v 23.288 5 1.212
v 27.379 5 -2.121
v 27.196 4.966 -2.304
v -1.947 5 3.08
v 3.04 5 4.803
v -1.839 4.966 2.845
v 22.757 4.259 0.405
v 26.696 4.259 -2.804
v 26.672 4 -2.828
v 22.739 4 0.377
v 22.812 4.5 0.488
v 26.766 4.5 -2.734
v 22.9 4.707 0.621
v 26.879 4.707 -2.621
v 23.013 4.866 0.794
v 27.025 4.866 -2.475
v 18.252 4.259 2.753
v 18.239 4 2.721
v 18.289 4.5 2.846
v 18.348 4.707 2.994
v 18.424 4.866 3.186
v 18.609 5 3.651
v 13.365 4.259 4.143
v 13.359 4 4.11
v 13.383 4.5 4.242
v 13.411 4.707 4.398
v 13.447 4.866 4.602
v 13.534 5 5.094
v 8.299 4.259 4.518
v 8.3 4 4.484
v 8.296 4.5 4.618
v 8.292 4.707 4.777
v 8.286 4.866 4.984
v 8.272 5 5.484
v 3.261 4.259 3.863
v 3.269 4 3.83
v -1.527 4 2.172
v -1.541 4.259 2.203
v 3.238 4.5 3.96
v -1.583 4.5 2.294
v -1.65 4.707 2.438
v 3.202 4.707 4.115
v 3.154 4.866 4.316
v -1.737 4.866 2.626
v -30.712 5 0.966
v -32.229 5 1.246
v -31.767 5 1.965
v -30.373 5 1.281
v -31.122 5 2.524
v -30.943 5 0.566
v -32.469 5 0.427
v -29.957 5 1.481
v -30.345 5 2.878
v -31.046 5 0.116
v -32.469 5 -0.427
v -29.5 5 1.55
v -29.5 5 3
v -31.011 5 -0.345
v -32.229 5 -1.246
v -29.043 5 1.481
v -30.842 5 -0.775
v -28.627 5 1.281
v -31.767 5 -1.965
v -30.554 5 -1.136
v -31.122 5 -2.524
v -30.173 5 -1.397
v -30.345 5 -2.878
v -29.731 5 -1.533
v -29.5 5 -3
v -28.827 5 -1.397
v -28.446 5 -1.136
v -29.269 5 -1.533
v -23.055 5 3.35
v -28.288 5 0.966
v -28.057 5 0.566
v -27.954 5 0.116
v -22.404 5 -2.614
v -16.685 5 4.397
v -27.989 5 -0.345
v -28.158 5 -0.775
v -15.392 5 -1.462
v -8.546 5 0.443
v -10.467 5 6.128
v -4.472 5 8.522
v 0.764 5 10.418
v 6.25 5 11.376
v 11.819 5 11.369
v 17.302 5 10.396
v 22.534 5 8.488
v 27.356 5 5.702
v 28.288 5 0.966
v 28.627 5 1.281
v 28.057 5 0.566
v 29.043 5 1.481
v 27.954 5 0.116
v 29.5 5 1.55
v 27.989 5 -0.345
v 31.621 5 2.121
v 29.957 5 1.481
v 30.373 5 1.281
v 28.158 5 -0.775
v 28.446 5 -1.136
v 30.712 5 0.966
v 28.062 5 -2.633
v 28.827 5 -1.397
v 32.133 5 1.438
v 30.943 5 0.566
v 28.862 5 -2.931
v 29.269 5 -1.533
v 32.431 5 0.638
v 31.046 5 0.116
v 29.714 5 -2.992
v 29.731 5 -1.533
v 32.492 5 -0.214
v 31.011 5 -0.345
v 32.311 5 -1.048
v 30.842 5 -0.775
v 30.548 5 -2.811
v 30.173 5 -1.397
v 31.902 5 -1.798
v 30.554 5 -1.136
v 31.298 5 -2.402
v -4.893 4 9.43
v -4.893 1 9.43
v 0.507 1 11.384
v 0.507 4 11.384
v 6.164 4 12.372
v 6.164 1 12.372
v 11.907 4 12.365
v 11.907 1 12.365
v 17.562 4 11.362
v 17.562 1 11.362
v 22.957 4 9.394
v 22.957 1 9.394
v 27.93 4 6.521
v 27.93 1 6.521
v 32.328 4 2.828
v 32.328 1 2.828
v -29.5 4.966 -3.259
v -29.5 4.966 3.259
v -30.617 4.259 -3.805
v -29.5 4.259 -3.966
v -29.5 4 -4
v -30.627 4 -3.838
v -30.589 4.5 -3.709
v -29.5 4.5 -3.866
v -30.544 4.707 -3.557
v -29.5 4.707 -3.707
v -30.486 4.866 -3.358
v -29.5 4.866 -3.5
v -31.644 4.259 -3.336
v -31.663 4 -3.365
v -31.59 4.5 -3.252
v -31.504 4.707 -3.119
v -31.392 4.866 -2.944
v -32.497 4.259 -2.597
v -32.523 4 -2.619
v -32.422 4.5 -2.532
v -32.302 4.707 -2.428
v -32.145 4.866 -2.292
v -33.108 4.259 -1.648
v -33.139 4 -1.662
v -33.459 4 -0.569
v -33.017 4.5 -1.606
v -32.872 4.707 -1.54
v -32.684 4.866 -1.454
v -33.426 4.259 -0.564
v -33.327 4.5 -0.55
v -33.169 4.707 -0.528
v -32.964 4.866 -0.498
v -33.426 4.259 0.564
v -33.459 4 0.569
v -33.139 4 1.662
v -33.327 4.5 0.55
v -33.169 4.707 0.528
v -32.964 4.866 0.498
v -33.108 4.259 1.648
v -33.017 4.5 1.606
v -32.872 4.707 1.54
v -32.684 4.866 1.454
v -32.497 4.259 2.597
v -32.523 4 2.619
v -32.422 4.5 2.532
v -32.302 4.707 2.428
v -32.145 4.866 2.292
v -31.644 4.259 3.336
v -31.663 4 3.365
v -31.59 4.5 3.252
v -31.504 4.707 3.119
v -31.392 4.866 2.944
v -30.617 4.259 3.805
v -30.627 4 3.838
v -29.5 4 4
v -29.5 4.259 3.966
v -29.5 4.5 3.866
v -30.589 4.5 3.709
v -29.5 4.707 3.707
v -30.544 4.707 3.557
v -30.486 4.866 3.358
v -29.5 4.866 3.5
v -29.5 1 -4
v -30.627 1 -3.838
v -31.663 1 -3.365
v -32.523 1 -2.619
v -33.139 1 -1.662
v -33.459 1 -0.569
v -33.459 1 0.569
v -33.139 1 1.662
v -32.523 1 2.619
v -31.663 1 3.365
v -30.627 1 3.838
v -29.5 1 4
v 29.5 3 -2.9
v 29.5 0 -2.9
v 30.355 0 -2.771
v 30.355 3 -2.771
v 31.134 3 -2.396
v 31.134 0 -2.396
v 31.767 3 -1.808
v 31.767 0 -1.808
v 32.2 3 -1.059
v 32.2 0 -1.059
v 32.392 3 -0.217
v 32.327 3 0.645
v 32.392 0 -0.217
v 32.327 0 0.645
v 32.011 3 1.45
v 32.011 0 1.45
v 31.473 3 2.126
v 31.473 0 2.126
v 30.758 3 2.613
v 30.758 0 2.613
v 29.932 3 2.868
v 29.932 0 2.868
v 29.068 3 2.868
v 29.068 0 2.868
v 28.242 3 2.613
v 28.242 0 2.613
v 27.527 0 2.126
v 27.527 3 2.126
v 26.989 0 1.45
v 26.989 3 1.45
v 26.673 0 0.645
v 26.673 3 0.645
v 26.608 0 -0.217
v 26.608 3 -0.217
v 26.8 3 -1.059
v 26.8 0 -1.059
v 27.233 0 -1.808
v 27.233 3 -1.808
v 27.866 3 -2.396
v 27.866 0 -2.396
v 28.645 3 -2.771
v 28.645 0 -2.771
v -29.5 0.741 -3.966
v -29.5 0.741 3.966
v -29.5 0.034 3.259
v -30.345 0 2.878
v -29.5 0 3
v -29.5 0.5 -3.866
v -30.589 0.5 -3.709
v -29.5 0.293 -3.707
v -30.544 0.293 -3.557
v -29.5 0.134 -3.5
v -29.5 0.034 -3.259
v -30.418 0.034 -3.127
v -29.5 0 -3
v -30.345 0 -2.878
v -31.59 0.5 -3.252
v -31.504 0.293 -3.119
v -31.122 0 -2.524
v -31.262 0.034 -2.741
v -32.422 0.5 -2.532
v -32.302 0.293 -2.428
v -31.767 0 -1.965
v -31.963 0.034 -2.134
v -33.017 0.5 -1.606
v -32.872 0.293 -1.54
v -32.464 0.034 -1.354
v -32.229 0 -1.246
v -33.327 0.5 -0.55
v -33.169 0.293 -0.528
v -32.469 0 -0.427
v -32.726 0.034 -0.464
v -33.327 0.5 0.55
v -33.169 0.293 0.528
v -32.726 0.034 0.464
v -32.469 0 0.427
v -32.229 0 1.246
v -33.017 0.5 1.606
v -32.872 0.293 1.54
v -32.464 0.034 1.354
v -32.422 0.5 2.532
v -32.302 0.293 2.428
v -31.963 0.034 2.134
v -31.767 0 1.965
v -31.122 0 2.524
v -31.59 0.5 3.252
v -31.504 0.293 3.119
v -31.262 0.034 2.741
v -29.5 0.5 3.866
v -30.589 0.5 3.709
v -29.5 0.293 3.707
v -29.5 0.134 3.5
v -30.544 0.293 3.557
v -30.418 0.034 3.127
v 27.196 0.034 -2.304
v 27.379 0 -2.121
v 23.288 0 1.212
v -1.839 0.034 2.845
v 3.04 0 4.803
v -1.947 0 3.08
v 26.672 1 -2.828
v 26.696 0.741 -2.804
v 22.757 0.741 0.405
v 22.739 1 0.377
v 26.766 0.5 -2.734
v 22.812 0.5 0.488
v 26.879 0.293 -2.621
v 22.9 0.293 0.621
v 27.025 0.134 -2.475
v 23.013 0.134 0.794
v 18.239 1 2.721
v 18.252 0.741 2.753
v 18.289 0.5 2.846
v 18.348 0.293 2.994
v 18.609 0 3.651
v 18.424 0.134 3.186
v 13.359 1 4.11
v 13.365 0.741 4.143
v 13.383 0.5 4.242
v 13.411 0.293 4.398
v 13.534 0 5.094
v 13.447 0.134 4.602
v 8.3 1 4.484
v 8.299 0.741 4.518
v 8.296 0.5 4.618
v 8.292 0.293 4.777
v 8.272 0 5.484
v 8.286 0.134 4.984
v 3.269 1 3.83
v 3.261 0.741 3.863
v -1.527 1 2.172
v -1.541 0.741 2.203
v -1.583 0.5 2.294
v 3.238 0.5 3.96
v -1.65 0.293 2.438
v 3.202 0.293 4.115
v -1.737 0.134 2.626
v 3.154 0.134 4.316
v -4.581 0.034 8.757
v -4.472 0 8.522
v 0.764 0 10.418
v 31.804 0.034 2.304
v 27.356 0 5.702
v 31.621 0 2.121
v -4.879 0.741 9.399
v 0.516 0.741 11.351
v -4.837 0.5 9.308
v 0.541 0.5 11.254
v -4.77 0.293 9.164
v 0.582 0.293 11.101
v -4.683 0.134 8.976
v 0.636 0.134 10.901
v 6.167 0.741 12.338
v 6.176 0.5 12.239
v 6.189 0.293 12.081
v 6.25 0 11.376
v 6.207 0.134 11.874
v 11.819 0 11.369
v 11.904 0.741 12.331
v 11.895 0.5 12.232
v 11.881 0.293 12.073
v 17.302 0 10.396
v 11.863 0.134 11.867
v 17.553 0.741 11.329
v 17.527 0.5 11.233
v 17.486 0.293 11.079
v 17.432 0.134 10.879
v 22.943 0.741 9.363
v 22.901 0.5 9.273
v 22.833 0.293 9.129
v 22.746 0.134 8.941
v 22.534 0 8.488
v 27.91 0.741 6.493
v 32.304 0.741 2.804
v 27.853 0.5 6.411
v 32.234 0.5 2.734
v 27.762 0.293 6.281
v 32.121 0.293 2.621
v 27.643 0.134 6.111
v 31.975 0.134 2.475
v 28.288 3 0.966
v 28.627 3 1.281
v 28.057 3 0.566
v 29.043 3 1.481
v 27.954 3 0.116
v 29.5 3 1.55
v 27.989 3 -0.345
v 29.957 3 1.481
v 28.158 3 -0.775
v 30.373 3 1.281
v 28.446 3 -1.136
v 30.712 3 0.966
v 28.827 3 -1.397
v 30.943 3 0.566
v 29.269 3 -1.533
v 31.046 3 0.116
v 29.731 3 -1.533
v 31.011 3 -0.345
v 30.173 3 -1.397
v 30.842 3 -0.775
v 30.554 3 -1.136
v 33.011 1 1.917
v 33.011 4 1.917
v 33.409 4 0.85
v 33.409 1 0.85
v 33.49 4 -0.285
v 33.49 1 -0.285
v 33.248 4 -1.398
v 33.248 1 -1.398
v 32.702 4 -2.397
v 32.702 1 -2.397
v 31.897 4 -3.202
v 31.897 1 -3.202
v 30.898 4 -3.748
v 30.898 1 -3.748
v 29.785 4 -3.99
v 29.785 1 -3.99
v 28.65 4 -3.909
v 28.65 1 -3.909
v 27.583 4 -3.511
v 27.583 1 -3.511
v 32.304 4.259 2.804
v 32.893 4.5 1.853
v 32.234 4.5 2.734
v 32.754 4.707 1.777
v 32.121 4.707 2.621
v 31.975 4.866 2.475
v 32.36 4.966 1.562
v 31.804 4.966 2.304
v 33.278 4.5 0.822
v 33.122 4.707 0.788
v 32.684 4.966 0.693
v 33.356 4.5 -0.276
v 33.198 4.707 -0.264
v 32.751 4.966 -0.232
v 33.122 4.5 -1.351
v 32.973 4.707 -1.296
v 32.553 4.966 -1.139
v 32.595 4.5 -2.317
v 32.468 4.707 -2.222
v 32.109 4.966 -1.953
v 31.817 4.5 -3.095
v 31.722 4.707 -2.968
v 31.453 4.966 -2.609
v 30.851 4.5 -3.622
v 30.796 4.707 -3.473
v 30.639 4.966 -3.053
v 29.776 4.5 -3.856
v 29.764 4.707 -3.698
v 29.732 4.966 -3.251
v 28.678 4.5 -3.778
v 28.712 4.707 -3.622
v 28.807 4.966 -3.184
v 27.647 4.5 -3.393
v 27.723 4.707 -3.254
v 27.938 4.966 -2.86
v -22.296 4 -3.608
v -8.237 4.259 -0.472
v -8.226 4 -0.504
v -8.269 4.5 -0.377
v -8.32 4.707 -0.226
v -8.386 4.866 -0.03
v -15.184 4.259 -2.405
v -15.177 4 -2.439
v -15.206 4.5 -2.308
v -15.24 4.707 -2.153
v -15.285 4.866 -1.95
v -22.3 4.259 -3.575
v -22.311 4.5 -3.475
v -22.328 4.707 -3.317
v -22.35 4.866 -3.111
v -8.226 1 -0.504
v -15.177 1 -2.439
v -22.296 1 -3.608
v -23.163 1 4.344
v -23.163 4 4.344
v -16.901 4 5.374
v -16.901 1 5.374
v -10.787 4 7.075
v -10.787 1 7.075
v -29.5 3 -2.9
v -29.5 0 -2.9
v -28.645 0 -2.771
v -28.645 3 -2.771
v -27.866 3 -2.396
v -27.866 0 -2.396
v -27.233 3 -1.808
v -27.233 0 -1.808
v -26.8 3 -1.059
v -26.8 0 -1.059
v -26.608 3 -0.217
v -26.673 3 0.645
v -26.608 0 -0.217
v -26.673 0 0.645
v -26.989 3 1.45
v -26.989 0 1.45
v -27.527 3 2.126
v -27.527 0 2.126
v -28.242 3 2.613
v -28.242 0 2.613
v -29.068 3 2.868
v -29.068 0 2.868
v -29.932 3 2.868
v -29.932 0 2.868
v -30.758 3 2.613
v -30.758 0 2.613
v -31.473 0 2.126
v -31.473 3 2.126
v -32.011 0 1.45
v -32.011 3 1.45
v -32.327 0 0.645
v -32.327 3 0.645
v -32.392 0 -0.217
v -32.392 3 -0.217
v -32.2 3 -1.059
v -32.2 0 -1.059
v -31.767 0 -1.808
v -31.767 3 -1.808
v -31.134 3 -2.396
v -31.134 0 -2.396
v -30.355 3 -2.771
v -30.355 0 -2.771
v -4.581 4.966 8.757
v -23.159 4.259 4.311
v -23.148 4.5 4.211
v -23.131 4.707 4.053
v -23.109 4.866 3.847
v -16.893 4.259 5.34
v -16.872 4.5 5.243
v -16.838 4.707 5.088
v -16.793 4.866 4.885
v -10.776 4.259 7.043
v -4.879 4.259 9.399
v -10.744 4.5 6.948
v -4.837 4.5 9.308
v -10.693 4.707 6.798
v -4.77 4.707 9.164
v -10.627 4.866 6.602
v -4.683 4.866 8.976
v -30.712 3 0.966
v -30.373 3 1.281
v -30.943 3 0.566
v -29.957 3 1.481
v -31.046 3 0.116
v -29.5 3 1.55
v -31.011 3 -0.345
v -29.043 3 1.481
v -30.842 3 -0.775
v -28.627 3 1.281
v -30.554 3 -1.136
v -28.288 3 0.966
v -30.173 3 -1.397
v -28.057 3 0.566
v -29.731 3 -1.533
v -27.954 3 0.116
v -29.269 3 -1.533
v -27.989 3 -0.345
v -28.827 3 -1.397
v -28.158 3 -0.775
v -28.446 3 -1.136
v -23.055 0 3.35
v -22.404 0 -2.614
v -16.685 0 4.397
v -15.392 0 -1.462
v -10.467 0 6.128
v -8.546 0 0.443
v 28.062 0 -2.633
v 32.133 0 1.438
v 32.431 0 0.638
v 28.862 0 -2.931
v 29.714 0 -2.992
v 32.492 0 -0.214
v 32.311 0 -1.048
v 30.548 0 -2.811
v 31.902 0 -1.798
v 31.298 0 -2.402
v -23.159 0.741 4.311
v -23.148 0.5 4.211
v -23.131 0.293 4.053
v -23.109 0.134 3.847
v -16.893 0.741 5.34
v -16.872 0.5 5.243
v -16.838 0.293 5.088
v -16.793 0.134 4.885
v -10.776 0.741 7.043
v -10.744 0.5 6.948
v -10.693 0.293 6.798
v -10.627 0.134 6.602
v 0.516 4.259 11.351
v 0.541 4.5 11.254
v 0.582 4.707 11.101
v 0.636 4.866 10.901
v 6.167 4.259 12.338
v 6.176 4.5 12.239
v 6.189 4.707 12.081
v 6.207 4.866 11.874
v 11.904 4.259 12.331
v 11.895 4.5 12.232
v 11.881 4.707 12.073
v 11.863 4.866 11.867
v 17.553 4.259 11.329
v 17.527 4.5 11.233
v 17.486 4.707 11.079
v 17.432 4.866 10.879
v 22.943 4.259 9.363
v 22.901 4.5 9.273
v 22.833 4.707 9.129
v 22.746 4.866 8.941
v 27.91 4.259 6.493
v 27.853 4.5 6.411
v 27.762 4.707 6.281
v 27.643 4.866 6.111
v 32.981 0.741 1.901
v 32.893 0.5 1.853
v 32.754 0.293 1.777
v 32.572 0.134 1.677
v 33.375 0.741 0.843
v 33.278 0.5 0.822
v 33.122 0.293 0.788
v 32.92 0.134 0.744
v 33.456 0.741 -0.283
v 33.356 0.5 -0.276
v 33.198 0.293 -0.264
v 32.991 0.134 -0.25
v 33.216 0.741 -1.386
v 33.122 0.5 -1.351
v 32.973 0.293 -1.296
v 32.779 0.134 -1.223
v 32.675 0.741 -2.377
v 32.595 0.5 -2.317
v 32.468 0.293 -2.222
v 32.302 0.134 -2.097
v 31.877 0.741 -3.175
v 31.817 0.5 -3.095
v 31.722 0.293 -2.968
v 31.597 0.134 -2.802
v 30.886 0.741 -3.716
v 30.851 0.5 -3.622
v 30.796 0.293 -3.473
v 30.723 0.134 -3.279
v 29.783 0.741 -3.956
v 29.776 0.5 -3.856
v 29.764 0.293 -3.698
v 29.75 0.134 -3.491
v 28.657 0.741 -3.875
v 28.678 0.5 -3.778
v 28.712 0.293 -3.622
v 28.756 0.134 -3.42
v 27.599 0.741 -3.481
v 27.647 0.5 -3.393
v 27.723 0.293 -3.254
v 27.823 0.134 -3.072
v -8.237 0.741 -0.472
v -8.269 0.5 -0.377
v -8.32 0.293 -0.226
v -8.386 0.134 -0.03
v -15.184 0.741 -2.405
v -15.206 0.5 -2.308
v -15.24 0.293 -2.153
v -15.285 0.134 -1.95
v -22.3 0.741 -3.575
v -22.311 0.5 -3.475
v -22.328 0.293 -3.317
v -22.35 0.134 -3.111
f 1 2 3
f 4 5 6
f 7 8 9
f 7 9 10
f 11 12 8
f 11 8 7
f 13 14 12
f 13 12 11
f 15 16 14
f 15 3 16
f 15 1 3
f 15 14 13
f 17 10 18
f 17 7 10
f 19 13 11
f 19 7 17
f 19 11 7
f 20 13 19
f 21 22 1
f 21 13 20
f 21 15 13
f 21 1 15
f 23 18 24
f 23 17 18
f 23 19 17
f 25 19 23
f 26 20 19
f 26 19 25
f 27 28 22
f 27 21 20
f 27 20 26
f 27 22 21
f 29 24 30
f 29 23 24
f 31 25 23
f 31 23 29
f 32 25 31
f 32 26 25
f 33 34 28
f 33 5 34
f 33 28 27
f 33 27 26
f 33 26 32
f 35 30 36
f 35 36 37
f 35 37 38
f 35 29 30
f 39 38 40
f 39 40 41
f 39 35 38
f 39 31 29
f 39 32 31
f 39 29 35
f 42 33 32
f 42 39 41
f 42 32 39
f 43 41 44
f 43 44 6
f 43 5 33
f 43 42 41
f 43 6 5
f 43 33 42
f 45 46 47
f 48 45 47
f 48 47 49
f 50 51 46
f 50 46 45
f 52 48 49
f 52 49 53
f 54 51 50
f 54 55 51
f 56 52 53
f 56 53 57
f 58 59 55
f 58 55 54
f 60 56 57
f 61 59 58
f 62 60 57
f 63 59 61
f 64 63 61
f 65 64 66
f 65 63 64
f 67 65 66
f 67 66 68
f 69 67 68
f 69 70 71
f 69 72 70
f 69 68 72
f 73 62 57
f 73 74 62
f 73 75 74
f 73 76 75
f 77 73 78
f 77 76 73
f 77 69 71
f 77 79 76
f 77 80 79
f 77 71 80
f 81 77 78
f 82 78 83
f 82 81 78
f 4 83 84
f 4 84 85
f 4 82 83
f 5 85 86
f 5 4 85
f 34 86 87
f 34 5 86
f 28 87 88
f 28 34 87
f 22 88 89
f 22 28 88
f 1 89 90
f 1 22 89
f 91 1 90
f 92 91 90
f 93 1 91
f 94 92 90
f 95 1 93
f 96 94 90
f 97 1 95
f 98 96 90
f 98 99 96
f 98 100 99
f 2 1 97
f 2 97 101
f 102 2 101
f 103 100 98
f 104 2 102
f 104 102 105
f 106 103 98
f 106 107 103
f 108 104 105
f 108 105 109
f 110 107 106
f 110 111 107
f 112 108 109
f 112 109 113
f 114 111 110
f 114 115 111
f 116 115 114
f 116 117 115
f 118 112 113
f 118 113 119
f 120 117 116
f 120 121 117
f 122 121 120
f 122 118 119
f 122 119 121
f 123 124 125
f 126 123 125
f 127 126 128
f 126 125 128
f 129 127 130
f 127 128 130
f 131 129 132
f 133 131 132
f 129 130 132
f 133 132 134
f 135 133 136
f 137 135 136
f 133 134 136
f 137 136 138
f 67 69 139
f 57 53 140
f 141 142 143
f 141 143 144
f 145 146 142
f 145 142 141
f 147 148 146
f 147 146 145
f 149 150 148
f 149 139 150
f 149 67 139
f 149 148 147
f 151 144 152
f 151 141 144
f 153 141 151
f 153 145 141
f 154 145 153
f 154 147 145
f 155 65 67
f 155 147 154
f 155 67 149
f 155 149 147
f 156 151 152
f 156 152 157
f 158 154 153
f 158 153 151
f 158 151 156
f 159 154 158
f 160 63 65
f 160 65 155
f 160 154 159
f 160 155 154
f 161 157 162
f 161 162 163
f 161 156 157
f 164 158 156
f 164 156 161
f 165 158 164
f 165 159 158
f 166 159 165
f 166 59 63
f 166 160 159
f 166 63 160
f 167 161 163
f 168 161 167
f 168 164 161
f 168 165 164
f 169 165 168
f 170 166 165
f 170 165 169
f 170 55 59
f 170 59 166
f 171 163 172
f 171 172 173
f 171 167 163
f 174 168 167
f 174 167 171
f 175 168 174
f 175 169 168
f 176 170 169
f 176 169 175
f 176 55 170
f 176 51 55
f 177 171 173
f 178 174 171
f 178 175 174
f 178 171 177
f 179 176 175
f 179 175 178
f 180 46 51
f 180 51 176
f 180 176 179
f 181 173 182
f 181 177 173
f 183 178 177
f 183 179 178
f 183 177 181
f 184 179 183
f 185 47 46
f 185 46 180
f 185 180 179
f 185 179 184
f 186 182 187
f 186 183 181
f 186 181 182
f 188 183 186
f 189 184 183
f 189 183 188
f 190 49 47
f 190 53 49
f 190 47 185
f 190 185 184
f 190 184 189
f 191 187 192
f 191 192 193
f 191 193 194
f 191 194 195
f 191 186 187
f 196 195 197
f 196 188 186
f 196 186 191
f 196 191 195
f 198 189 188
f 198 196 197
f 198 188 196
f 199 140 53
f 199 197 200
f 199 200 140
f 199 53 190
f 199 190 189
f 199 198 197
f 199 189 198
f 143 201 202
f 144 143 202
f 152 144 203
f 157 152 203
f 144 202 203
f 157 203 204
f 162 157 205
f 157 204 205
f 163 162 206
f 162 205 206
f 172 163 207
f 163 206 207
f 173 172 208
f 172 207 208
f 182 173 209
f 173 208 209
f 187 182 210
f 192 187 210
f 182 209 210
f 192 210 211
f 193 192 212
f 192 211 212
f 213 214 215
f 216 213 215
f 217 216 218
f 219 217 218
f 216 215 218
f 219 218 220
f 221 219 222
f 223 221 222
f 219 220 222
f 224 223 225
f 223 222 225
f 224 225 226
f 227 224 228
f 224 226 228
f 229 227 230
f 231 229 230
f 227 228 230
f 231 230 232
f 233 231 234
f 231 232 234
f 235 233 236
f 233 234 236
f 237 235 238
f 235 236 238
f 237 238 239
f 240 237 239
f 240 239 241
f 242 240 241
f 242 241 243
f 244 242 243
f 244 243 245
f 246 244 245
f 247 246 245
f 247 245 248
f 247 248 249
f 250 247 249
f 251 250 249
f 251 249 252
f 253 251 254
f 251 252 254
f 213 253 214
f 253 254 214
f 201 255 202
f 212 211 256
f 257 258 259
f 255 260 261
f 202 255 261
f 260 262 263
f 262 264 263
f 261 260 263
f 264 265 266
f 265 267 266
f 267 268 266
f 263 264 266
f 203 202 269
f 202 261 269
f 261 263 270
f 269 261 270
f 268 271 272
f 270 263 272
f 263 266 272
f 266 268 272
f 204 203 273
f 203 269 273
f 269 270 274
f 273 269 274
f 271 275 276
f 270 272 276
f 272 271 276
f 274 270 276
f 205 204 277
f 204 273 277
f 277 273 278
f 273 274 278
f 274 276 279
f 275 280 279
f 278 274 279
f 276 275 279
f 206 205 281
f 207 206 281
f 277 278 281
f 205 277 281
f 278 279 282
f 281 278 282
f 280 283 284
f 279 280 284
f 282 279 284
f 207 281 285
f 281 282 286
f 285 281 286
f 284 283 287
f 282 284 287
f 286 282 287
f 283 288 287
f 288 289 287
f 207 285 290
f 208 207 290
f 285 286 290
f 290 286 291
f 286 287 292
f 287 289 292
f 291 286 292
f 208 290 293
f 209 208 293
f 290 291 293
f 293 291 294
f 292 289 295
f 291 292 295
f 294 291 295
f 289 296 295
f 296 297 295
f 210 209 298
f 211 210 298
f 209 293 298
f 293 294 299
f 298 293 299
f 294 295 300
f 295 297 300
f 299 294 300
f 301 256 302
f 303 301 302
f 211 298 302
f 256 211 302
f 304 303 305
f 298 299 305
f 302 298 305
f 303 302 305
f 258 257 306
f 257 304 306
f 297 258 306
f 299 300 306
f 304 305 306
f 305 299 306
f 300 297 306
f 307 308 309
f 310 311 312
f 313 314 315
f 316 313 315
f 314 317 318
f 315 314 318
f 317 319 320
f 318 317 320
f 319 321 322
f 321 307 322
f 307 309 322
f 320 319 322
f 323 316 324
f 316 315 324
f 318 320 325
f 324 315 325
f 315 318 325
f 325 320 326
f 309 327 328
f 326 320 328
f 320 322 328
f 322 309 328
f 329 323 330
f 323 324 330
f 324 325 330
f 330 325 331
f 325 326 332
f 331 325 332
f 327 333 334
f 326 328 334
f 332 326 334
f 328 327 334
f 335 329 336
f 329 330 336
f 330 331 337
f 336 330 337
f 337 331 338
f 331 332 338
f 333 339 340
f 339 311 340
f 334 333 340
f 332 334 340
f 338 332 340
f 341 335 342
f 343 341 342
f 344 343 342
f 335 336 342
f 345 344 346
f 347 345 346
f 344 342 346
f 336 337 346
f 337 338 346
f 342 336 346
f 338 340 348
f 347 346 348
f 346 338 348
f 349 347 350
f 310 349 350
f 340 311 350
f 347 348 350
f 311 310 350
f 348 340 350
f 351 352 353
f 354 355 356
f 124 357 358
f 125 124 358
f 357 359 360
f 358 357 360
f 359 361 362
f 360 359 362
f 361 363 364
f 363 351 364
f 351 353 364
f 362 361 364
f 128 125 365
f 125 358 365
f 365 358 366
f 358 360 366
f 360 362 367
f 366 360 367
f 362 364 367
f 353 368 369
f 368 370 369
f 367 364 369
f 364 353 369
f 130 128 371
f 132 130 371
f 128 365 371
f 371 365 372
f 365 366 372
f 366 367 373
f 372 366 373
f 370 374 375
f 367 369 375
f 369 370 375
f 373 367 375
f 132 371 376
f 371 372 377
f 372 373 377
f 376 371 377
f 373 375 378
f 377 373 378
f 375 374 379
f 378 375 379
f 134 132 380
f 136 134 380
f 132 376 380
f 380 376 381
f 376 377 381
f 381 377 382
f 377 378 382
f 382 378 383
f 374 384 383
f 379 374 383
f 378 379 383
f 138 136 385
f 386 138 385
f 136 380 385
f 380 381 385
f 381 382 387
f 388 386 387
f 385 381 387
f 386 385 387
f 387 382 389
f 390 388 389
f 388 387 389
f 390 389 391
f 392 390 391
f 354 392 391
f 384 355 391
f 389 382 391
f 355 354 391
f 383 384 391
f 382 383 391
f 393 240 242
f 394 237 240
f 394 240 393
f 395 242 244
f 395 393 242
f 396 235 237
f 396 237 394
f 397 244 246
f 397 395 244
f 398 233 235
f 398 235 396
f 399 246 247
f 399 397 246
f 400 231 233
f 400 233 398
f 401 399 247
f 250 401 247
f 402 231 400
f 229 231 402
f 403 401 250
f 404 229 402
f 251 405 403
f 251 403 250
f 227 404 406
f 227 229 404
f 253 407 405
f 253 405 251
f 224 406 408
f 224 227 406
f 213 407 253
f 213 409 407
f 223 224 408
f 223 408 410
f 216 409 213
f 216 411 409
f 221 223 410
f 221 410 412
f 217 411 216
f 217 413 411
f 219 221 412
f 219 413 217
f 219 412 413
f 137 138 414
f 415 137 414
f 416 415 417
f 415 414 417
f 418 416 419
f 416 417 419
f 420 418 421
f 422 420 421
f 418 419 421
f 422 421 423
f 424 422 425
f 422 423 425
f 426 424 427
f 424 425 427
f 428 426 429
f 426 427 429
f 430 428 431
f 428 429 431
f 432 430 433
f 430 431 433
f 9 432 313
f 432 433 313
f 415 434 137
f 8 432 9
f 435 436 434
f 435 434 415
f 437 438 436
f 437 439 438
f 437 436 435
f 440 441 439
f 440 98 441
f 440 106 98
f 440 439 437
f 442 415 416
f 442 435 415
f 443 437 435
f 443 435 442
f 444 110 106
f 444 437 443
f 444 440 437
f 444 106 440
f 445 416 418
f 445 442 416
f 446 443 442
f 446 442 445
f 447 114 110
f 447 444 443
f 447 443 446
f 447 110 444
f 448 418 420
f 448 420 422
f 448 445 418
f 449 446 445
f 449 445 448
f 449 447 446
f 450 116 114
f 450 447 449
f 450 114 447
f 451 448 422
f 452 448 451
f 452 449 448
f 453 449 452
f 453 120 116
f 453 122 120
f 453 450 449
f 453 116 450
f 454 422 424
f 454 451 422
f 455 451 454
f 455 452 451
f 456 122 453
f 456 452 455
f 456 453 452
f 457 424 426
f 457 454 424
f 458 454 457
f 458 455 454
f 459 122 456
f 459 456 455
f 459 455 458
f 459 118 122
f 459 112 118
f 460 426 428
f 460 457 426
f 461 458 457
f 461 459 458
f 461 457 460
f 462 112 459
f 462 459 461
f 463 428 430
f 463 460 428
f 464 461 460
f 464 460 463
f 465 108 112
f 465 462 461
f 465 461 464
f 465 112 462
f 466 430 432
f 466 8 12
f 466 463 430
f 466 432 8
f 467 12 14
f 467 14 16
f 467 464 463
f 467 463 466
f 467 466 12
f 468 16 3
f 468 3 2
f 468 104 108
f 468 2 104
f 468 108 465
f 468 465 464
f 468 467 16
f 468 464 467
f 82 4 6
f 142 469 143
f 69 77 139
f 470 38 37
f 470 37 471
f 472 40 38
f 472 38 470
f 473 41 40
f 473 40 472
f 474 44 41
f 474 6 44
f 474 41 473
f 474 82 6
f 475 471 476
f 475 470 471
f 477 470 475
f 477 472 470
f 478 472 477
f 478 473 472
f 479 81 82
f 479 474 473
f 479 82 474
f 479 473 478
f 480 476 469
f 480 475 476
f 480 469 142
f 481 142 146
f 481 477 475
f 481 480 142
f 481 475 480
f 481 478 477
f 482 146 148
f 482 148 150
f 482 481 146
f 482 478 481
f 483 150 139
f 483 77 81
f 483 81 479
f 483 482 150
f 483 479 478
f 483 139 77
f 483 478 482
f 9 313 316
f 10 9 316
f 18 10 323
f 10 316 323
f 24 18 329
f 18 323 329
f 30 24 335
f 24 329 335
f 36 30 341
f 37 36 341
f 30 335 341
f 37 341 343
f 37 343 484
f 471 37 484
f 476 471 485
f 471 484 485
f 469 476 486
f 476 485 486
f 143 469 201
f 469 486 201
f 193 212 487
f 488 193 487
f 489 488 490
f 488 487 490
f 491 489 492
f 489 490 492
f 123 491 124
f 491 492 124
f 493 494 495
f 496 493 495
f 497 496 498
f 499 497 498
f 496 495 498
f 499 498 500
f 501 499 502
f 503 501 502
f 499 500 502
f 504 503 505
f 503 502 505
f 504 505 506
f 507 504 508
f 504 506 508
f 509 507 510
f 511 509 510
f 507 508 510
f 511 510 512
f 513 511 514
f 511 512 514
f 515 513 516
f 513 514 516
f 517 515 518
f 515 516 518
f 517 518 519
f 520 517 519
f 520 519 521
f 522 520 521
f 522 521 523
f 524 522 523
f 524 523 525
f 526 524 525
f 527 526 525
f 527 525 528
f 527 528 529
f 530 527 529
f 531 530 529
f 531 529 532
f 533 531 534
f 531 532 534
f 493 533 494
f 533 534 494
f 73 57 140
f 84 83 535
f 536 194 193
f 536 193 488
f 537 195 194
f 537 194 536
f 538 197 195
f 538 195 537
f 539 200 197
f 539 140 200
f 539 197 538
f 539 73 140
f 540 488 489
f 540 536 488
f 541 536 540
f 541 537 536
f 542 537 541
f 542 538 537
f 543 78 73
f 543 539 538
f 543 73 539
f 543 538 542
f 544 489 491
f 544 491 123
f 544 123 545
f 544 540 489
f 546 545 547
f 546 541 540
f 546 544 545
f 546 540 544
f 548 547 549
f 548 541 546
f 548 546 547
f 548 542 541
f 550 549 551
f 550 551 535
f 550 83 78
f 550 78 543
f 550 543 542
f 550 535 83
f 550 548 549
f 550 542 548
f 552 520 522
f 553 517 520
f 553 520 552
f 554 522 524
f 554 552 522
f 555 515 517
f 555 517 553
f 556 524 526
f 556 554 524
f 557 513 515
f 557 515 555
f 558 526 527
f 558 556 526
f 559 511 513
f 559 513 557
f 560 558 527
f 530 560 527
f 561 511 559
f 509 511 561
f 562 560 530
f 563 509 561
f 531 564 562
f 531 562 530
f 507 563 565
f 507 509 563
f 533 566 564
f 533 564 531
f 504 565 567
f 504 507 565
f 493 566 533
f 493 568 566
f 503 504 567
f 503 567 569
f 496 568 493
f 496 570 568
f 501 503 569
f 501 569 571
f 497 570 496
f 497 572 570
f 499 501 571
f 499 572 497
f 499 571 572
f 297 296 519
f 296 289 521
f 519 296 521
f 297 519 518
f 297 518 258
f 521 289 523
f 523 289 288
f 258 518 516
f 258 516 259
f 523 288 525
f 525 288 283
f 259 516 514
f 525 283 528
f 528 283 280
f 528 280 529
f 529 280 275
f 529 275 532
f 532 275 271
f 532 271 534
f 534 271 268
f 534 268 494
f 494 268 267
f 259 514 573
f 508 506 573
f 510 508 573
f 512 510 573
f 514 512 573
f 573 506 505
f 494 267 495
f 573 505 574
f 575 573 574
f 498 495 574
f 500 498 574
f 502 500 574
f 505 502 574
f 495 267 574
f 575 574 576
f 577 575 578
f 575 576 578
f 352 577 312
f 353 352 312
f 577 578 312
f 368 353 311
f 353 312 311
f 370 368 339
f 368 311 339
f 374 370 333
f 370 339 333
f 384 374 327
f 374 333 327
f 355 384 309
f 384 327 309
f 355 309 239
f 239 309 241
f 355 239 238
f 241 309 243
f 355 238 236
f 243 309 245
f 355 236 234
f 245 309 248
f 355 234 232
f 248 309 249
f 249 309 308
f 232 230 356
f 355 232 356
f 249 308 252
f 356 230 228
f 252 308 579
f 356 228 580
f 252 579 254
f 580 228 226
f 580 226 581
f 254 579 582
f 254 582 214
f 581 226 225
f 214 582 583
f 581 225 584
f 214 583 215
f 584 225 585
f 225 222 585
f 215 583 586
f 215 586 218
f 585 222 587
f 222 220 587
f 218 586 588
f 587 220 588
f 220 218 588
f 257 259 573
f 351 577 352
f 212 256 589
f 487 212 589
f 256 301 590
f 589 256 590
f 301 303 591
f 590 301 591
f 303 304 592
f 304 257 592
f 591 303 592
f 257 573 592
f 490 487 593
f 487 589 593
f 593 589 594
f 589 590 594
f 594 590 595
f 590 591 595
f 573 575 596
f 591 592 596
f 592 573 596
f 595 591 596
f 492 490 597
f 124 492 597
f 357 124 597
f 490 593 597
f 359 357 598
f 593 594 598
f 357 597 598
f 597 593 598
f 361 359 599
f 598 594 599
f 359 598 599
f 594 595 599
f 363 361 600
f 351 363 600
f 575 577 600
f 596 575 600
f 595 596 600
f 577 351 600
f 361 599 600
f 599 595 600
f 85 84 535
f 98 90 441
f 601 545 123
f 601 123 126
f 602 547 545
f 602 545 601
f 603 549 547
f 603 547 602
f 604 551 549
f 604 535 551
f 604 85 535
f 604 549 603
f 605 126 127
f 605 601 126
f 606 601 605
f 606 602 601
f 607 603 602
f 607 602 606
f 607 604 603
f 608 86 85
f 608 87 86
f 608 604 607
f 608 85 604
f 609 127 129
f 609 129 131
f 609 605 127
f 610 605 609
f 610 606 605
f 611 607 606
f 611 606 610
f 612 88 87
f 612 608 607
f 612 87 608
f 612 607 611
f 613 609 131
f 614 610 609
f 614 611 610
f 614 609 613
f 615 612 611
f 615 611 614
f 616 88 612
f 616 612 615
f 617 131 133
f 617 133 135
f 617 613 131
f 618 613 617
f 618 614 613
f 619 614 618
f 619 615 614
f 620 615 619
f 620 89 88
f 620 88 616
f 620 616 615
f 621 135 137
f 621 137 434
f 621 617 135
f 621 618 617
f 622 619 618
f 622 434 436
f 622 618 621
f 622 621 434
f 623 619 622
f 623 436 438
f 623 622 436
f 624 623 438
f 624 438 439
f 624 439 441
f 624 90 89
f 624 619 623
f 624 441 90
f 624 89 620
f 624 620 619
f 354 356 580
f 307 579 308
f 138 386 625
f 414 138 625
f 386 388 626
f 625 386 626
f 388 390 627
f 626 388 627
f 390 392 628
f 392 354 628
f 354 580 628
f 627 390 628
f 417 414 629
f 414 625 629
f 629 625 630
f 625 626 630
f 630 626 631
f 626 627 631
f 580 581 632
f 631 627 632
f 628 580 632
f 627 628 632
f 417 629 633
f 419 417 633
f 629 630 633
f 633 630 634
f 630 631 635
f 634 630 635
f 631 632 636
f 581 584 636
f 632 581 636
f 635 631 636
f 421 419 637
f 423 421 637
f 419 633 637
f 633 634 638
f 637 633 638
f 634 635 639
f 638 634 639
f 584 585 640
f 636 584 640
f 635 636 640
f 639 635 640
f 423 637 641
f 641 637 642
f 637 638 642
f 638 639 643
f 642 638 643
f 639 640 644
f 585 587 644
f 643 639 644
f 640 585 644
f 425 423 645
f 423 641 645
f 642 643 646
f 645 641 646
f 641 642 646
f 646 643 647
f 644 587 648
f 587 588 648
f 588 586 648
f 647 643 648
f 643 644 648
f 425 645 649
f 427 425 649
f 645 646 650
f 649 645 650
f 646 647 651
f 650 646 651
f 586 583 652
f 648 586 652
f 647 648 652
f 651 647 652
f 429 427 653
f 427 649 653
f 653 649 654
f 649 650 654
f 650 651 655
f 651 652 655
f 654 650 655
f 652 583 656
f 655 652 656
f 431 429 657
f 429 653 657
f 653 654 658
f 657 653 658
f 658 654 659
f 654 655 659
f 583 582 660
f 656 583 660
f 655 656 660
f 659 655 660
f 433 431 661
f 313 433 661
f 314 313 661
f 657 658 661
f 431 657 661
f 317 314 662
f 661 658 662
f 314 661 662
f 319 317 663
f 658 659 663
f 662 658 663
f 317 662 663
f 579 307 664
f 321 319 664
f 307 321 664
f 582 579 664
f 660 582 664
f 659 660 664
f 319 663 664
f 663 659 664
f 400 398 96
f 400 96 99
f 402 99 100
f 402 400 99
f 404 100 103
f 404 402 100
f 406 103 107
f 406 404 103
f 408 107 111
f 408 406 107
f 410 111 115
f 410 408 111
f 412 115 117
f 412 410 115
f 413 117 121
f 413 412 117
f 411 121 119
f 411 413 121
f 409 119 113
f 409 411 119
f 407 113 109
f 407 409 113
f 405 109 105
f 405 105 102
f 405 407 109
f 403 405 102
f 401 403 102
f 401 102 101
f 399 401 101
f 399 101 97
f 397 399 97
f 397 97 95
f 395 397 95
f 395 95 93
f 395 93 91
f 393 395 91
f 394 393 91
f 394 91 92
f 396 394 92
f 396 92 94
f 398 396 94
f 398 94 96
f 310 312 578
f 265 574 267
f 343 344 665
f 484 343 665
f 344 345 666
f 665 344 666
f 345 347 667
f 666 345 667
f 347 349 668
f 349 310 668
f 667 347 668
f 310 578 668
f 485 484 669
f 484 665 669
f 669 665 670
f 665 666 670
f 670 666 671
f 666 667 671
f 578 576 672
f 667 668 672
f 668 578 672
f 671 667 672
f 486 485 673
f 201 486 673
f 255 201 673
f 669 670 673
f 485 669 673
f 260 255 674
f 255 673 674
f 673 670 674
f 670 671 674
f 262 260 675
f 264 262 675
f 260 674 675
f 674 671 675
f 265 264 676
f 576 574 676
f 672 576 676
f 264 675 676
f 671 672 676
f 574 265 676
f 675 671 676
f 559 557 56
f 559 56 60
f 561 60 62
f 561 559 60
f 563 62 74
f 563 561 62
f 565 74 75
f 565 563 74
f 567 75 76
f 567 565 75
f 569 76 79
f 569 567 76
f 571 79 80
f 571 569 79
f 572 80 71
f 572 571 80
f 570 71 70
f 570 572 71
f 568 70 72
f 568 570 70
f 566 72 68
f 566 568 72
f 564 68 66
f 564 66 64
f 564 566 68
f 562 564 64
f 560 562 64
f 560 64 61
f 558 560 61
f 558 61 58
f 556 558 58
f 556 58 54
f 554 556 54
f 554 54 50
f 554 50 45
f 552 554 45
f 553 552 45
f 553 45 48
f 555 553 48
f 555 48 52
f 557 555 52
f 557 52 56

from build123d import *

# Parameters (mm, degrees)
SKETCH1_R           = 1.55
BOSS_EXTRUDE1_DEPTH = 5
FILLET1_R           = 1
SKETCH2_R           = 2.9
CUT_EXTRUDE1_DEPTH  = 3


with BuildPart() as part:
    # Sketch1 → Boss-Extrude1 (new body)
    with BuildSketch(Plane(origin=(0, 0, 0), x_dir=(1, 0, 0), z_dir=(0, 1, 0))):
        with BuildLine():
            ThreePointArc((-29.5, 4), (-33.5, 0), (-29.5, -4))
            ThreePointArc((-29.5, -4), (-16.900654795, -5.373538993), (-4.893229568, -9.429626812))
            ThreePointArc((-4.893229568, -9.429626812), (14.756477238, -11.986867848), (32.328427125, -2.828427125))
            ThreePointArc((32.328427125, -2.828427125), (32.328427125, 2.828427125), (26.671572875, 2.828427125))
            ThreePointArc((26.671572875, 2.828427125), (13.359489628, -4.109785544), (-1.526651892, -2.172481729))
            ThreePointArc((-1.526651892, -2.172481729), (-15.176874162, 2.438540137), (-29.5, 4))
        make_face()
        with Locations(Location((-29.5, 0, 0), (0, 0, 270))):
            Circle(SKETCH1_R, mode=Mode.SUBTRACT)
        with Locations(Location((29.5, 0, 0), (0, 0, 270))):
            Circle(SKETCH1_R, mode=Mode.SUBTRACT)
    extrude(amount=BOSS_EXTRUDE1_DEPTH)

    # Fillet1
    fillet1_edges = [part.edges().sort_by_distance(p)[0] for p in [
        (-16.900654795, 5, 5.373538993),
        (14.756477238, 5, 11.986867848),
        (32.328427125, 5, -2.828427125),
        (13.359489628, 5, 4.109785544),
        (-15.176874162, 5, -2.438540137),
        (13.359489628, 0, 4.109785544),
        (32.328427125, 0, -2.828427125),
        (14.756477238, 0, 11.986867848),
        (-16.900654795, 0, 5.373538993),
        (-33.5, 0, 0),
        (-15.176874162, 0, -2.438540137),
        (-33.5, 5, 0),
    ]]
    fillet(fillet1_edges, radius=FILLET1_R)

    # Sketch2 → Cut-Extrude1 (cut)
    with BuildSketch(Plane.XZ):
        with Locations(Location((29.5, 0, 0), (0, 0, 270))):
            Circle(SKETCH2_R)
        with Locations(Location((-29.5, 0, 0), (0, 0, 270))):
            Circle(SKETCH2_R)
    extrude(amount=-CUT_EXTRUDE1_DEPTH, mode=Mode.SUBTRACT)


solid = part.part
